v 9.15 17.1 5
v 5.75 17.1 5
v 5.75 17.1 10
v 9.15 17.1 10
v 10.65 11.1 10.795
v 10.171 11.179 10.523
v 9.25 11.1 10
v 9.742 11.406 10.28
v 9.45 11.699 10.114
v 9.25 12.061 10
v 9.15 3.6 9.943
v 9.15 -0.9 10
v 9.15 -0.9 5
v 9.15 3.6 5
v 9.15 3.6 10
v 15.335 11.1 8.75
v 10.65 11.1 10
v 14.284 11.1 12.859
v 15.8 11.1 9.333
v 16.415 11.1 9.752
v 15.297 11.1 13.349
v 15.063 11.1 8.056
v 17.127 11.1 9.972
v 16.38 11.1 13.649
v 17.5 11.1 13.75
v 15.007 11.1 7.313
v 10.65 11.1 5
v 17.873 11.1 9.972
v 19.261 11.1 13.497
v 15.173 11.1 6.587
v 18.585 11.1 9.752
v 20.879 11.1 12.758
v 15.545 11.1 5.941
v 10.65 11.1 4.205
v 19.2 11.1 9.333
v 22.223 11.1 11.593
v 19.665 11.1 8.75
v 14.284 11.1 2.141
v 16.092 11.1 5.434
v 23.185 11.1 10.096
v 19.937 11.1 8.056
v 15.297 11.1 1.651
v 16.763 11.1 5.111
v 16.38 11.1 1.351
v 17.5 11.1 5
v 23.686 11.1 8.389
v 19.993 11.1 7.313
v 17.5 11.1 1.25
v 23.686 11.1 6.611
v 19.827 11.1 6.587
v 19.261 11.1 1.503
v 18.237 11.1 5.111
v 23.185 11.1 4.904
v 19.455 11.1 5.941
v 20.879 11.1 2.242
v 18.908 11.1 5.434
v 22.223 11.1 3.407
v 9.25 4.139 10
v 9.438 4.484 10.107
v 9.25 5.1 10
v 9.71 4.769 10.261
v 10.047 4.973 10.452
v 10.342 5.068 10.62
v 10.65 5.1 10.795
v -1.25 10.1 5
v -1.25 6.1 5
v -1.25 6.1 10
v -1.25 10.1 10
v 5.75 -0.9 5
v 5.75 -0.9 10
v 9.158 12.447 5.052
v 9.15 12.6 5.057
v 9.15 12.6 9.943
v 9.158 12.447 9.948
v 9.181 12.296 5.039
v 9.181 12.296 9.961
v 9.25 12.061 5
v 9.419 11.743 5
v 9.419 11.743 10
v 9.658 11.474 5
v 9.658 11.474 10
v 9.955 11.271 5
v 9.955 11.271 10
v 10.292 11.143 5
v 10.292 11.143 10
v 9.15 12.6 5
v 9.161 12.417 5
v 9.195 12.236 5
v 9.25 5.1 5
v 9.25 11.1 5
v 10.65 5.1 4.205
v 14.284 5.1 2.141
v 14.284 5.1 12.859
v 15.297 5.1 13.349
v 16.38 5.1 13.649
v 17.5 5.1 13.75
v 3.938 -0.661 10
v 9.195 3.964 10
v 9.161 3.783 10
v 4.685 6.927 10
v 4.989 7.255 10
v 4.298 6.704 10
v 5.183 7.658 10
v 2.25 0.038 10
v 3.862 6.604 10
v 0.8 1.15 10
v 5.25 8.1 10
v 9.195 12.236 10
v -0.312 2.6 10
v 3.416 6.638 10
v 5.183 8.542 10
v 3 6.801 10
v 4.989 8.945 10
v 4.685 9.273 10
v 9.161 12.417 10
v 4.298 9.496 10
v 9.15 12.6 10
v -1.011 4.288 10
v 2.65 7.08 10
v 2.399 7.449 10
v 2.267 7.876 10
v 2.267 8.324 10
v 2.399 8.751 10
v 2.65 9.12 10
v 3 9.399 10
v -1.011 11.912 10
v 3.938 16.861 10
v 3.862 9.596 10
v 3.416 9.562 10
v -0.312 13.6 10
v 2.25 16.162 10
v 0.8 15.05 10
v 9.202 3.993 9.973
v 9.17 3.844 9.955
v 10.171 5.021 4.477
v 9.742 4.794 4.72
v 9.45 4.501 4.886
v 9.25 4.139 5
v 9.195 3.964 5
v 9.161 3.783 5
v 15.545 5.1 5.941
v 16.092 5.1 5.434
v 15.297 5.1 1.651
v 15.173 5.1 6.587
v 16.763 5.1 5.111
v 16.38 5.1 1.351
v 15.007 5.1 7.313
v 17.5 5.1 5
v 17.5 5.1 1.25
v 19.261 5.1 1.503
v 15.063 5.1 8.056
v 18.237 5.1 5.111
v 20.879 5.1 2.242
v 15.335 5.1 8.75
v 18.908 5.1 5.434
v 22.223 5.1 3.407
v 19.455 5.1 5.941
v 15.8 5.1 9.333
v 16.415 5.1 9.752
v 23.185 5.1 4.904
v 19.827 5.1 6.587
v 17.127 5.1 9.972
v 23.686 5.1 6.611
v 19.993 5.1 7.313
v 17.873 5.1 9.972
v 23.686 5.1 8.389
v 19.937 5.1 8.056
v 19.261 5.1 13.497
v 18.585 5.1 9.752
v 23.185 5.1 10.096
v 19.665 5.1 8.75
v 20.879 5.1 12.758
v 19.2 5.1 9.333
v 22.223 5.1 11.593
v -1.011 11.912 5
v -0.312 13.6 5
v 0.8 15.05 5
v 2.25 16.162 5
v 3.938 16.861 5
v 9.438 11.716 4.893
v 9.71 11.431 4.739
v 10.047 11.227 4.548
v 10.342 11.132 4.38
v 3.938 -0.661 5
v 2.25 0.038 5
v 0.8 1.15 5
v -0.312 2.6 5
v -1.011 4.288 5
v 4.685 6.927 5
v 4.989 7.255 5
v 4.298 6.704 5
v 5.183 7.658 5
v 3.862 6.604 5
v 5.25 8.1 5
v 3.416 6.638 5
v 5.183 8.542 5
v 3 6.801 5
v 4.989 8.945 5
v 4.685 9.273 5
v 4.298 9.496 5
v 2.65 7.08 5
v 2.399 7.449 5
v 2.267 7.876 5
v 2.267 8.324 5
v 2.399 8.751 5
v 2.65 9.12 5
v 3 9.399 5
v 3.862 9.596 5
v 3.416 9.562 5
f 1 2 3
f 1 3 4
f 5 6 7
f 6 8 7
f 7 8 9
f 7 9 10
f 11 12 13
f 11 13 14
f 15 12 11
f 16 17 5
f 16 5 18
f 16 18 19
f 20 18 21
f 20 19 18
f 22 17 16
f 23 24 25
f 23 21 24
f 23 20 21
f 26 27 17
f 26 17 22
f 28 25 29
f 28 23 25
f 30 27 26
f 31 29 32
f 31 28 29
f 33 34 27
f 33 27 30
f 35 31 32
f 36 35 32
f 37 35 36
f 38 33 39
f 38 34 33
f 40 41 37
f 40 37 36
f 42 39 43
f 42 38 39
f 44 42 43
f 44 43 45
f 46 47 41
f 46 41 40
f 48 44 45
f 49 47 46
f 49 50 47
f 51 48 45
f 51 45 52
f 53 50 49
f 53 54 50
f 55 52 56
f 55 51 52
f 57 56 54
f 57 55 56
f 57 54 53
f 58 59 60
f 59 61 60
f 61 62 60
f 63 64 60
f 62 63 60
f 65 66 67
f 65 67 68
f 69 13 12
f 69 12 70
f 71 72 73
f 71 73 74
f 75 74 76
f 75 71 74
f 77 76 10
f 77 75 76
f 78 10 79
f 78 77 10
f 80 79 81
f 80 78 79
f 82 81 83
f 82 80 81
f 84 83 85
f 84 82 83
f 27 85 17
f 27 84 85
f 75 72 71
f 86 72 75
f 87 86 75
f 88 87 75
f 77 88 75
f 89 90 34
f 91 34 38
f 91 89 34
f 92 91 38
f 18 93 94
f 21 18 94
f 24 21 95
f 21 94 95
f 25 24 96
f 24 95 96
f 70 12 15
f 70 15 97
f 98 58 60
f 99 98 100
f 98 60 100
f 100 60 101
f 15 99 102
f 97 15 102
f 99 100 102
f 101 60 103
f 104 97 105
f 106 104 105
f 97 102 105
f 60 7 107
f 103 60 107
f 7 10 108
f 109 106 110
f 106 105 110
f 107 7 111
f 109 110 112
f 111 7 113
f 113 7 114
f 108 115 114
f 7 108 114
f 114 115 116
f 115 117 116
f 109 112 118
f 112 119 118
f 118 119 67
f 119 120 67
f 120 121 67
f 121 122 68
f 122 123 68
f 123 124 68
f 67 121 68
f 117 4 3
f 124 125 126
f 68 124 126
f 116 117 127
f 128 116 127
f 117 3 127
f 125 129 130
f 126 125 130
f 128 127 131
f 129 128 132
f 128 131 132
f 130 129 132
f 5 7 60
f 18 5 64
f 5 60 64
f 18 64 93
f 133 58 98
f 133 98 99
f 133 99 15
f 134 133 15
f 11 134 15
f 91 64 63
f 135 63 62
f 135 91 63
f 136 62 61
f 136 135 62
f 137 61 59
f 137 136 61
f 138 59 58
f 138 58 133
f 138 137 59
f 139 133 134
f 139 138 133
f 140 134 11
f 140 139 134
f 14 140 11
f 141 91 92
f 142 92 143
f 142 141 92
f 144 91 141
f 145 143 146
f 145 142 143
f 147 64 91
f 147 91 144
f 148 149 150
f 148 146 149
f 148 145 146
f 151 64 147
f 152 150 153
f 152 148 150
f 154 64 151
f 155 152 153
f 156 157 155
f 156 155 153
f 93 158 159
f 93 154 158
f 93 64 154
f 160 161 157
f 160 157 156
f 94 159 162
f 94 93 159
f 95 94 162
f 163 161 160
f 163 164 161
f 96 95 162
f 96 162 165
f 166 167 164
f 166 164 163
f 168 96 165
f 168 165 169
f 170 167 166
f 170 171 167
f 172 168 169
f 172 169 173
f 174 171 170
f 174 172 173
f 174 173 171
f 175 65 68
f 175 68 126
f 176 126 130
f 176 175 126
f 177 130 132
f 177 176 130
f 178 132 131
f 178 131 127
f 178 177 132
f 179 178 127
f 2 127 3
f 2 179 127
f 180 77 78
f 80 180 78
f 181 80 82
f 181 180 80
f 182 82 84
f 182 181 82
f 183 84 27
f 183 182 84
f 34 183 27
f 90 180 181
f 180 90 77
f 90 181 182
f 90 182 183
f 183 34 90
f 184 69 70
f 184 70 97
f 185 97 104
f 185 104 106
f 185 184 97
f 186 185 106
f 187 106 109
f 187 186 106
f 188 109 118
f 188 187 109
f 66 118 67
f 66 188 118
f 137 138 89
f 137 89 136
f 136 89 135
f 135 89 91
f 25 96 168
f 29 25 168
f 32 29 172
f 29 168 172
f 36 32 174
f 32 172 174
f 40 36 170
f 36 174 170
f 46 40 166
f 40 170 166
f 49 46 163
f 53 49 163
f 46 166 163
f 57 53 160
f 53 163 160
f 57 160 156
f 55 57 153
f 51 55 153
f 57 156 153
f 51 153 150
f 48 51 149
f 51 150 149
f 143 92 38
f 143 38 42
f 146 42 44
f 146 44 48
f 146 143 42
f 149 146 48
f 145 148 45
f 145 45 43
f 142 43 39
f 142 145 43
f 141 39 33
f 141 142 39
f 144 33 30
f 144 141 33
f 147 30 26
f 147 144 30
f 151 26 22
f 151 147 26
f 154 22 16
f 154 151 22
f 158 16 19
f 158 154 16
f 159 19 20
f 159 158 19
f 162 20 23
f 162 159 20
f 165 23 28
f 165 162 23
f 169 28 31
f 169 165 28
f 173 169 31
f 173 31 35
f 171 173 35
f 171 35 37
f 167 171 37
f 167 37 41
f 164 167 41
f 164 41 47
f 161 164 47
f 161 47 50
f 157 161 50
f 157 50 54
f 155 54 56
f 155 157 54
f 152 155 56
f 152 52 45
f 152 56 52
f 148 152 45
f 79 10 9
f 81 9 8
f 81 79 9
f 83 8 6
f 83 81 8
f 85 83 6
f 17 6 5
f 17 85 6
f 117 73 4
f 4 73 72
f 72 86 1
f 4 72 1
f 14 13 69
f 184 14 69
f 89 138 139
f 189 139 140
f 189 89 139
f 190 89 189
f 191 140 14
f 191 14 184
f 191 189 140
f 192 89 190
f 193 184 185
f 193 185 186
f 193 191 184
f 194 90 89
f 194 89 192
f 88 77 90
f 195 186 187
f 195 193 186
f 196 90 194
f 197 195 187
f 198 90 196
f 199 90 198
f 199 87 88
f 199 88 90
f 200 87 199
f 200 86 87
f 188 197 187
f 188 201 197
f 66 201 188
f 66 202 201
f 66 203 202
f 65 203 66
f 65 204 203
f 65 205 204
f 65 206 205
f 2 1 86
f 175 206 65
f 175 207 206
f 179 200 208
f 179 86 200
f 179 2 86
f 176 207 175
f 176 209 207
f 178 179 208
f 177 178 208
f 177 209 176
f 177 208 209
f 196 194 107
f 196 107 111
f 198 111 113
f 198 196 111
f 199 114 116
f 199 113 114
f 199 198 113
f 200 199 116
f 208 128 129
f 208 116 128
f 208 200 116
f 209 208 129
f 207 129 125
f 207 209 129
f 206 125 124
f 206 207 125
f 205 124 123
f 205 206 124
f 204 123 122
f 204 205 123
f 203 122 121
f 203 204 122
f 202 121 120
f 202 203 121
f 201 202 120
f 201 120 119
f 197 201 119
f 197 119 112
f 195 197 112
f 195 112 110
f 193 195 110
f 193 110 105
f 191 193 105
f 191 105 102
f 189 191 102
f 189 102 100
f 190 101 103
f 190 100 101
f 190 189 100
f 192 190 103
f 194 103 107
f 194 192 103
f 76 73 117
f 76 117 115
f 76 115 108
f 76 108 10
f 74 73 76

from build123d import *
from build123d.topology import SkipClean

# Parameters (mm, degrees)
CROQUIS1_R              = 1.5
SALIENTE_EXTRUIR1_DEPTH = 15
CROQUIS2_R              = 2.5
CORTAR_EXTRUIR1_DEPTH   = 20
CORTAR_EXTRUIR2_START   = -22
CORTAR_EXTRUIR2_DEPTH   = 22
CROQUIS4_W              = 2.1
CROQUIS4_H              = 6
CORTAR_EXTRUIR4_DEPTH   = 10
REDONDEO1_R             = 1.5


with BuildPart() as part:
    # Croquis1 → Saliente-Extruir1 (new body)
    with BuildSketch(Plane.XY):
        with BuildLine():
            Line((11.25, 17.1), (11.25, 11.1))
            Line((11.25, 11.1), (23.75, 11.1))
            Line((23.75, 11.1), (23.75, 5.1))
            Line((23.75, 5.1), (11.25, 5.1))
            Line((11.25, 5.1), (11.25, -0.9))
            Line((11.25, -0.9), (5.75, -0.9))
            ThreePointArc((5.75, -0.9), (0.800252532, 1.150252532), (-1.25, 6.1))
            Line((-1.25, 6.1), (-1.25, 10.1))
            ThreePointArc((-1.25, 10.1), (0.800252532, 15.049747468), (5.75, 17.1))
            Line((5.75, 17.1), (11.25, 17.1))
        make_face()
        with Locations((3.75, 8.1)):
            Circle(CROQUIS1_R, mode=Mode.SUBTRACT)
    extrude(amount=SALIENTE_EXTRUIR1_DEPTH)

    # Croquis2 → Cortar-Extruir1 (cut)
    with BuildSketch(Plane(origin=(0, 0, 0), x_dir=(1, 0, 0), z_dir=(0, 1, 0))):
        with Locations(Location((17.5, -7.5, 0), (0, 0, 90))):
            Circle(CROQUIS2_R)
        with BuildLine():
            Line((17.5, -1.25), (11.25, 0))
            Line((11.25, 0), (11.126279301, 1.868603497))
            Line((11.126279301, 1.868603497), (29.663453957, 1.868603497))
            Line((29.663453957, 1.868603497), (29.663453957, -17.961269996))
            Line((29.663453957, -17.961269996), (11.25, -17.961269996))
            Line((11.25, -17.961269996), (11.25, -15))
            Line((11.25, -15), (17.5, -13.75))
            ThreePointArc((17.5, -13.75), (23.75, -7.5), (17.5, -1.25))
        make_face()
    extrude(amount=CORTAR_EXTRUIR1_DEPTH, mode=Mode.SUBTRACT)

    # Croquis3 → Cortar-Extruir2 (cut)
    with SkipClean():  # the faces are left unmerged after this step: merging them gives an invalid solid
        with BuildSketch(Plane(origin=(0, 17.1, 0), x_dir=(1, 0, 0), z_dir=(0, 1, 0)).offset(CORTAR_EXTRUIR2_START)):
            with BuildLine():
                Line((-4.130088798, -10), (9.25, -10))
                Line((9.25, -10), (14.284401529, -12.859330786))
                ThreePointArc((14.284401529, -12.859330786), (15.831665113, -13.523218301), (17.5, -13.75))
                Line((17.5, -13.75), (17.5, -15.581395259))
                Line((17.5, -15.581395259), (-4.130088798, -15.581395259))
                Line((-4.130088798, -15.581395259), (-4.130088798, -10))
            make_face()
            with BuildLine():
                Line((-3.464792336, -5), (9.25, -5))
                Line((9.25, -5), (14.284401529, -2.140669214))
                ThreePointArc((14.284401529, -2.140669214), (15.831665113, -1.476781699), (17.5, -1.25))
                Line((17.5, -1.25), (17.5, 1.677177667))
                Line((17.5, 1.677177667), (-3.464792336, 1.677177667))
                Line((-3.464792336, 1.677177667), (-3.464792336, -5))
            make_face()
        extrude(amount=CORTAR_EXTRUIR2_DEPTH, mode=Mode.SUBTRACT)

    # Croquis4 → Cortar-Extruir4 (cut, symmetric)
    with SkipClean():  # the faces are left unmerged after this step: merging them gives an invalid solid
        with BuildSketch(Plane.XY.offset(10)):
            with Locations((10.2, 14.1)):
                Rectangle(CROQUIS4_W, CROQUIS4_H)
            with Locations((10.2, 2.1)):
                Rectangle(CROQUIS4_W, CROQUIS4_H)
        extrude(amount=CORTAR_EXTRUIR4_DEPTH, both=True, mode=Mode.SUBTRACT)

    # Redondeo1
    # the kernel refuses this fillet: 1.5 mm, written as the material it adds along each edge
    with BuildSketch(Plane(origin=(9.15, 5.1, 1.25), x_dir=(0, -1, 0), z_dir=(0, 0, 1))) as redondeo1_piece_1_section:
        with BuildLine():
            CenterArc((REDONDEO1_R, REDONDEO1_R), REDONDEO1_R, 180, 90)
            Line((0, REDONDEO1_R), (0, 0))
            Line((0, 0), (REDONDEO1_R, 0))
        make_face()
    redondeo1_piece_1 = extrude(amount=8.75, mode=Mode.PRIVATE)
    redondeo1_piece_1 = split(redondeo1_piece_1, bisect_by=Plane(origin=(9.866987005, 4.973706672, 5), z_dir=(0, 0, -1)), keep=Keep.TOP, mode=Mode.PRIVATE)
    redondeo1_piece_1 = split(redondeo1_piece_1, bisect_by=Plane(origin=(9.791745369, 4.973706672, 4.692311151), z_dir=(0.49386255985599625, 0, 0.8695399772135164)), keep=Keep.TOP, mode=Mode.PRIVATE)
    add(redondeo1_piece_1)
    with BuildSketch(Plane(origin=(9.15, 5.1, 5), x_dir=(0, -1, 0), z_dir=(0, 0, 1))) as redondeo1_piece_2_section:
        with BuildLine():
            CenterArc((REDONDEO1_R, REDONDEO1_R), REDONDEO1_R, 180, 90)
            Line((0, REDONDEO1_R), (0, 0))
            Line((0, 0), (REDONDEO1_R, 0))
        make_face()
    redondeo1_piece_2 = extrude(amount=5, mode=Mode.PRIVATE)
    redondeo1_piece_2 = split(redondeo1_piece_2, bisect_by=Plane(origin=(9.170637547, 4.440228568, 5.045074574), z_dir=(-0.49386255985599625, 0, -0.8695399772135164)), keep=Keep.TOP, mode=Mode.PRIVATE)
    add(redondeo1_piece_2)
    with BuildSketch(Plane(origin=(9.15, 5.1, 5), x_dir=(0, -1, 0), z_dir=(0, 0, 1))) as redondeo1_piece_3_section:
        with BuildLine():
            CenterArc((REDONDEO1_R, REDONDEO1_R), REDONDEO1_R, 180, 90)
            Line((0, REDONDEO1_R), (0, 0))
            Line((0, 0), (REDONDEO1_R, 0))
        make_face()
    redondeo1_piece_3 = extrude(amount=5, mode=Mode.PRIVATE)
    redondeo1_piece_3 = split(redondeo1_piece_3, bisect_by=Plane(origin=(8.358711998, 4.761869179, 9.493785466), z_dir=(0.49386255985599636, 0, -0.8695399772135163)), keep=Keep.TOP, mode=Mode.PRIVATE)
    redondeo1_piece_3 = split(redondeo1_piece_3, bisect_by=Plane(origin=(8.358711998, 4.761869179, 5.506214534), z_dir=(0.49386255985599625, 0, 0.8695399772135164)), keep=Keep.TOP, mode=Mode.PRIVATE)
    add(redondeo1_piece_3)
    with BuildSketch(Plane(origin=(9.15, 5.1, 5), x_dir=(0, -1, 0), z_dir=(0, 0, 1))) as redondeo1_piece_4_section:
        with BuildLine():
            CenterArc((REDONDEO1_R, REDONDEO1_R), REDONDEO1_R, 180, 90)
            Line((0, REDONDEO1_R), (0, 0))
            Line((0, 0), (REDONDEO1_R, 0))
        make_face()
    redondeo1_piece_4 = extrude(amount=8.75, mode=Mode.PRIVATE)
    redondeo1_piece_4 = split(redondeo1_piece_4, bisect_by=Plane(origin=(9.866987005, 4.973706672, 10), z_dir=(0, 0, 1)), keep=Keep.TOP, mode=Mode.PRIVATE)
    redondeo1_piece_4 = split(redondeo1_piece_4, bisect_by=Plane(origin=(9.791745369, 4.973706672, 10.307688849), z_dir=(0.49386255985599636, 0, -0.8695399772135163)), keep=Keep.TOP, mode=Mode.PRIVATE)
    add(redondeo1_piece_4)
    with BuildSketch(Plane(origin=(9.15, 5.1, 5), x_dir=(0, -1, 0), z_dir=(0, 0, 1))) as redondeo1_piece_5_section:
        with BuildLine():
            CenterArc((REDONDEO1_R, REDONDEO1_R), REDONDEO1_R, 180, 90)
            Line((0, REDONDEO1_R), (0, 0))
            Line((0, 0), (REDONDEO1_R, 0))
        make_face()
    redondeo1_piece_5 = extrude(amount=5, mode=Mode.PRIVATE)
    redondeo1_piece_5 = split(redondeo1_piece_5, bisect_by=Plane(origin=(9.170637547, 4.440228568, 9.954925426), z_dir=(-0.49386255985599636, 0, 0.8695399772135163)), keep=Keep.TOP, mode=Mode.PRIVATE)
    add(redondeo1_piece_5)
    with BuildSketch(Plane(origin=(9.15, 11.1, 5), x_dir=(1, 0, 0), z_dir=(0, 0, 1))) as redondeo1_piece_6_section:
        with BuildLine():
            CenterArc((REDONDEO1_R, REDONDEO1_R), REDONDEO1_R, 180, 90)
            Line((0, REDONDEO1_R), (0, 0))
            Line((0, 0), (REDONDEO1_R, 0))
        make_face()
    redondeo1_piece_6 = extrude(amount=5, mode=Mode.PRIVATE)
    redondeo1_piece_6 = split(redondeo1_piece_6, bisect_by=Plane(origin=(9.17063755, 11.759771469, 5.045074573), z_dir=(-0.49386255985599625, 0, -0.8695399772135164)), keep=Keep.TOP, mode=Mode.PRIVATE)
    add(redondeo1_piece_6)
    with BuildSketch(Plane(origin=(9.15, 11.1, 1.25), x_dir=(1, 0, 0), z_dir=(0, 0, 1))) as redondeo1_piece_7_section:
        with BuildLine():
            CenterArc((REDONDEO1_R, REDONDEO1_R), REDONDEO1_R, 180, 90)
            Line((0, REDONDEO1_R), (0, 0))
            Line((0, 0), (REDONDEO1_R, 0))
        make_face()
    redondeo1_piece_7 = extrude(amount=8.75, mode=Mode.PRIVATE)
    redondeo1_piece_7 = split(redondeo1_piece_7, bisect_by=Plane(origin=(9.866987013, 11.226293308, 5), z_dir=(0, 0, -1)), keep=Keep.TOP, mode=Mode.PRIVATE)
    redondeo1_piece_7 = split(redondeo1_piece_7, bisect_by=Plane(origin=(9.791745378, 11.226293308, 4.692311146), z_dir=(0.49386255985599625, 0, 0.8695399772135164)), keep=Keep.TOP, mode=Mode.PRIVATE)
    add(redondeo1_piece_7)
    with BuildSketch(Plane(origin=(9.15, 11.1, 5), x_dir=(1, 0, 0), z_dir=(0, 0, 1))) as redondeo1_piece_8_section:
        with BuildLine():
            CenterArc((REDONDEO1_R, REDONDEO1_R), REDONDEO1_R, 180, 90)
            Line((0, REDONDEO1_R), (0, 0))
            Line((0, 0), (REDONDEO1_R, 0))
        make_face()
    redondeo1_piece_8 = extrude(amount=5, mode=Mode.PRIVATE)
    redondeo1_piece_8 = split(redondeo1_piece_8, bisect_by=Plane(origin=(8.358711999, 11.438130822, 5.506214534), z_dir=(0.49386255985599625, 0, 0.8695399772135164)), keep=Keep.TOP, mode=Mode.PRIVATE)
    redondeo1_piece_8 = split(redondeo1_piece_8, bisect_by=Plane(origin=(8.358711999, 11.438130822, 9.493785466), z_dir=(0.49386255985599636, 0, -0.8695399772135163)), keep=Keep.TOP, mode=Mode.PRIVATE)
    add(redondeo1_piece_8)
    with BuildSketch(Plane(origin=(9.15, 11.1, 5), x_dir=(1, 0, 0), z_dir=(0, 0, 1))) as redondeo1_piece_9_section:
        with BuildLine():
            CenterArc((REDONDEO1_R, REDONDEO1_R), REDONDEO1_R, 180, 90)
            Line((0, REDONDEO1_R), (0, 0))
            Line((0, 0), (REDONDEO1_R, 0))
        make_face()
    redondeo1_piece_9 = extrude(amount=5, mode=Mode.PRIVATE)
    redondeo1_piece_9 = split(redondeo1_piece_9, bisect_by=Plane(origin=(9.17063755, 11.759771469, 9.954925427), z_dir=(-0.49386255985599636, 0, 0.8695399772135163)), keep=Keep.TOP, mode=Mode.PRIVATE)
    add(redondeo1_piece_9)
    with BuildSketch(Plane(origin=(9.15, 11.1, 5), x_dir=(1, 0, 0), z_dir=(0, 0, 1))) as redondeo1_piece_10_section:
        with BuildLine():
            CenterArc((REDONDEO1_R, REDONDEO1_R), REDONDEO1_R, 180, 90)
            Line((0, REDONDEO1_R), (0, 0))
            Line((0, 0), (REDONDEO1_R, 0))
        make_face()
    redondeo1_piece_10 = extrude(amount=8.75, mode=Mode.PRIVATE)
    redondeo1_piece_10 = split(redondeo1_piece_10, bisect_by=Plane(origin=(9.866987013, 11.226293308, 10), z_dir=(0, 0, 1)), keep=Keep.TOP, mode=Mode.PRIVATE)
    redondeo1_piece_10 = split(redondeo1_piece_10, bisect_by=Plane(origin=(9.791745378, 11.226293308, 10.307688854), z_dir=(0.49386255985599636, 0, -0.8695399772135163)), keep=Keep.TOP, mode=Mode.PRIVATE)
    add(redondeo1_piece_10)


solid = part.part
